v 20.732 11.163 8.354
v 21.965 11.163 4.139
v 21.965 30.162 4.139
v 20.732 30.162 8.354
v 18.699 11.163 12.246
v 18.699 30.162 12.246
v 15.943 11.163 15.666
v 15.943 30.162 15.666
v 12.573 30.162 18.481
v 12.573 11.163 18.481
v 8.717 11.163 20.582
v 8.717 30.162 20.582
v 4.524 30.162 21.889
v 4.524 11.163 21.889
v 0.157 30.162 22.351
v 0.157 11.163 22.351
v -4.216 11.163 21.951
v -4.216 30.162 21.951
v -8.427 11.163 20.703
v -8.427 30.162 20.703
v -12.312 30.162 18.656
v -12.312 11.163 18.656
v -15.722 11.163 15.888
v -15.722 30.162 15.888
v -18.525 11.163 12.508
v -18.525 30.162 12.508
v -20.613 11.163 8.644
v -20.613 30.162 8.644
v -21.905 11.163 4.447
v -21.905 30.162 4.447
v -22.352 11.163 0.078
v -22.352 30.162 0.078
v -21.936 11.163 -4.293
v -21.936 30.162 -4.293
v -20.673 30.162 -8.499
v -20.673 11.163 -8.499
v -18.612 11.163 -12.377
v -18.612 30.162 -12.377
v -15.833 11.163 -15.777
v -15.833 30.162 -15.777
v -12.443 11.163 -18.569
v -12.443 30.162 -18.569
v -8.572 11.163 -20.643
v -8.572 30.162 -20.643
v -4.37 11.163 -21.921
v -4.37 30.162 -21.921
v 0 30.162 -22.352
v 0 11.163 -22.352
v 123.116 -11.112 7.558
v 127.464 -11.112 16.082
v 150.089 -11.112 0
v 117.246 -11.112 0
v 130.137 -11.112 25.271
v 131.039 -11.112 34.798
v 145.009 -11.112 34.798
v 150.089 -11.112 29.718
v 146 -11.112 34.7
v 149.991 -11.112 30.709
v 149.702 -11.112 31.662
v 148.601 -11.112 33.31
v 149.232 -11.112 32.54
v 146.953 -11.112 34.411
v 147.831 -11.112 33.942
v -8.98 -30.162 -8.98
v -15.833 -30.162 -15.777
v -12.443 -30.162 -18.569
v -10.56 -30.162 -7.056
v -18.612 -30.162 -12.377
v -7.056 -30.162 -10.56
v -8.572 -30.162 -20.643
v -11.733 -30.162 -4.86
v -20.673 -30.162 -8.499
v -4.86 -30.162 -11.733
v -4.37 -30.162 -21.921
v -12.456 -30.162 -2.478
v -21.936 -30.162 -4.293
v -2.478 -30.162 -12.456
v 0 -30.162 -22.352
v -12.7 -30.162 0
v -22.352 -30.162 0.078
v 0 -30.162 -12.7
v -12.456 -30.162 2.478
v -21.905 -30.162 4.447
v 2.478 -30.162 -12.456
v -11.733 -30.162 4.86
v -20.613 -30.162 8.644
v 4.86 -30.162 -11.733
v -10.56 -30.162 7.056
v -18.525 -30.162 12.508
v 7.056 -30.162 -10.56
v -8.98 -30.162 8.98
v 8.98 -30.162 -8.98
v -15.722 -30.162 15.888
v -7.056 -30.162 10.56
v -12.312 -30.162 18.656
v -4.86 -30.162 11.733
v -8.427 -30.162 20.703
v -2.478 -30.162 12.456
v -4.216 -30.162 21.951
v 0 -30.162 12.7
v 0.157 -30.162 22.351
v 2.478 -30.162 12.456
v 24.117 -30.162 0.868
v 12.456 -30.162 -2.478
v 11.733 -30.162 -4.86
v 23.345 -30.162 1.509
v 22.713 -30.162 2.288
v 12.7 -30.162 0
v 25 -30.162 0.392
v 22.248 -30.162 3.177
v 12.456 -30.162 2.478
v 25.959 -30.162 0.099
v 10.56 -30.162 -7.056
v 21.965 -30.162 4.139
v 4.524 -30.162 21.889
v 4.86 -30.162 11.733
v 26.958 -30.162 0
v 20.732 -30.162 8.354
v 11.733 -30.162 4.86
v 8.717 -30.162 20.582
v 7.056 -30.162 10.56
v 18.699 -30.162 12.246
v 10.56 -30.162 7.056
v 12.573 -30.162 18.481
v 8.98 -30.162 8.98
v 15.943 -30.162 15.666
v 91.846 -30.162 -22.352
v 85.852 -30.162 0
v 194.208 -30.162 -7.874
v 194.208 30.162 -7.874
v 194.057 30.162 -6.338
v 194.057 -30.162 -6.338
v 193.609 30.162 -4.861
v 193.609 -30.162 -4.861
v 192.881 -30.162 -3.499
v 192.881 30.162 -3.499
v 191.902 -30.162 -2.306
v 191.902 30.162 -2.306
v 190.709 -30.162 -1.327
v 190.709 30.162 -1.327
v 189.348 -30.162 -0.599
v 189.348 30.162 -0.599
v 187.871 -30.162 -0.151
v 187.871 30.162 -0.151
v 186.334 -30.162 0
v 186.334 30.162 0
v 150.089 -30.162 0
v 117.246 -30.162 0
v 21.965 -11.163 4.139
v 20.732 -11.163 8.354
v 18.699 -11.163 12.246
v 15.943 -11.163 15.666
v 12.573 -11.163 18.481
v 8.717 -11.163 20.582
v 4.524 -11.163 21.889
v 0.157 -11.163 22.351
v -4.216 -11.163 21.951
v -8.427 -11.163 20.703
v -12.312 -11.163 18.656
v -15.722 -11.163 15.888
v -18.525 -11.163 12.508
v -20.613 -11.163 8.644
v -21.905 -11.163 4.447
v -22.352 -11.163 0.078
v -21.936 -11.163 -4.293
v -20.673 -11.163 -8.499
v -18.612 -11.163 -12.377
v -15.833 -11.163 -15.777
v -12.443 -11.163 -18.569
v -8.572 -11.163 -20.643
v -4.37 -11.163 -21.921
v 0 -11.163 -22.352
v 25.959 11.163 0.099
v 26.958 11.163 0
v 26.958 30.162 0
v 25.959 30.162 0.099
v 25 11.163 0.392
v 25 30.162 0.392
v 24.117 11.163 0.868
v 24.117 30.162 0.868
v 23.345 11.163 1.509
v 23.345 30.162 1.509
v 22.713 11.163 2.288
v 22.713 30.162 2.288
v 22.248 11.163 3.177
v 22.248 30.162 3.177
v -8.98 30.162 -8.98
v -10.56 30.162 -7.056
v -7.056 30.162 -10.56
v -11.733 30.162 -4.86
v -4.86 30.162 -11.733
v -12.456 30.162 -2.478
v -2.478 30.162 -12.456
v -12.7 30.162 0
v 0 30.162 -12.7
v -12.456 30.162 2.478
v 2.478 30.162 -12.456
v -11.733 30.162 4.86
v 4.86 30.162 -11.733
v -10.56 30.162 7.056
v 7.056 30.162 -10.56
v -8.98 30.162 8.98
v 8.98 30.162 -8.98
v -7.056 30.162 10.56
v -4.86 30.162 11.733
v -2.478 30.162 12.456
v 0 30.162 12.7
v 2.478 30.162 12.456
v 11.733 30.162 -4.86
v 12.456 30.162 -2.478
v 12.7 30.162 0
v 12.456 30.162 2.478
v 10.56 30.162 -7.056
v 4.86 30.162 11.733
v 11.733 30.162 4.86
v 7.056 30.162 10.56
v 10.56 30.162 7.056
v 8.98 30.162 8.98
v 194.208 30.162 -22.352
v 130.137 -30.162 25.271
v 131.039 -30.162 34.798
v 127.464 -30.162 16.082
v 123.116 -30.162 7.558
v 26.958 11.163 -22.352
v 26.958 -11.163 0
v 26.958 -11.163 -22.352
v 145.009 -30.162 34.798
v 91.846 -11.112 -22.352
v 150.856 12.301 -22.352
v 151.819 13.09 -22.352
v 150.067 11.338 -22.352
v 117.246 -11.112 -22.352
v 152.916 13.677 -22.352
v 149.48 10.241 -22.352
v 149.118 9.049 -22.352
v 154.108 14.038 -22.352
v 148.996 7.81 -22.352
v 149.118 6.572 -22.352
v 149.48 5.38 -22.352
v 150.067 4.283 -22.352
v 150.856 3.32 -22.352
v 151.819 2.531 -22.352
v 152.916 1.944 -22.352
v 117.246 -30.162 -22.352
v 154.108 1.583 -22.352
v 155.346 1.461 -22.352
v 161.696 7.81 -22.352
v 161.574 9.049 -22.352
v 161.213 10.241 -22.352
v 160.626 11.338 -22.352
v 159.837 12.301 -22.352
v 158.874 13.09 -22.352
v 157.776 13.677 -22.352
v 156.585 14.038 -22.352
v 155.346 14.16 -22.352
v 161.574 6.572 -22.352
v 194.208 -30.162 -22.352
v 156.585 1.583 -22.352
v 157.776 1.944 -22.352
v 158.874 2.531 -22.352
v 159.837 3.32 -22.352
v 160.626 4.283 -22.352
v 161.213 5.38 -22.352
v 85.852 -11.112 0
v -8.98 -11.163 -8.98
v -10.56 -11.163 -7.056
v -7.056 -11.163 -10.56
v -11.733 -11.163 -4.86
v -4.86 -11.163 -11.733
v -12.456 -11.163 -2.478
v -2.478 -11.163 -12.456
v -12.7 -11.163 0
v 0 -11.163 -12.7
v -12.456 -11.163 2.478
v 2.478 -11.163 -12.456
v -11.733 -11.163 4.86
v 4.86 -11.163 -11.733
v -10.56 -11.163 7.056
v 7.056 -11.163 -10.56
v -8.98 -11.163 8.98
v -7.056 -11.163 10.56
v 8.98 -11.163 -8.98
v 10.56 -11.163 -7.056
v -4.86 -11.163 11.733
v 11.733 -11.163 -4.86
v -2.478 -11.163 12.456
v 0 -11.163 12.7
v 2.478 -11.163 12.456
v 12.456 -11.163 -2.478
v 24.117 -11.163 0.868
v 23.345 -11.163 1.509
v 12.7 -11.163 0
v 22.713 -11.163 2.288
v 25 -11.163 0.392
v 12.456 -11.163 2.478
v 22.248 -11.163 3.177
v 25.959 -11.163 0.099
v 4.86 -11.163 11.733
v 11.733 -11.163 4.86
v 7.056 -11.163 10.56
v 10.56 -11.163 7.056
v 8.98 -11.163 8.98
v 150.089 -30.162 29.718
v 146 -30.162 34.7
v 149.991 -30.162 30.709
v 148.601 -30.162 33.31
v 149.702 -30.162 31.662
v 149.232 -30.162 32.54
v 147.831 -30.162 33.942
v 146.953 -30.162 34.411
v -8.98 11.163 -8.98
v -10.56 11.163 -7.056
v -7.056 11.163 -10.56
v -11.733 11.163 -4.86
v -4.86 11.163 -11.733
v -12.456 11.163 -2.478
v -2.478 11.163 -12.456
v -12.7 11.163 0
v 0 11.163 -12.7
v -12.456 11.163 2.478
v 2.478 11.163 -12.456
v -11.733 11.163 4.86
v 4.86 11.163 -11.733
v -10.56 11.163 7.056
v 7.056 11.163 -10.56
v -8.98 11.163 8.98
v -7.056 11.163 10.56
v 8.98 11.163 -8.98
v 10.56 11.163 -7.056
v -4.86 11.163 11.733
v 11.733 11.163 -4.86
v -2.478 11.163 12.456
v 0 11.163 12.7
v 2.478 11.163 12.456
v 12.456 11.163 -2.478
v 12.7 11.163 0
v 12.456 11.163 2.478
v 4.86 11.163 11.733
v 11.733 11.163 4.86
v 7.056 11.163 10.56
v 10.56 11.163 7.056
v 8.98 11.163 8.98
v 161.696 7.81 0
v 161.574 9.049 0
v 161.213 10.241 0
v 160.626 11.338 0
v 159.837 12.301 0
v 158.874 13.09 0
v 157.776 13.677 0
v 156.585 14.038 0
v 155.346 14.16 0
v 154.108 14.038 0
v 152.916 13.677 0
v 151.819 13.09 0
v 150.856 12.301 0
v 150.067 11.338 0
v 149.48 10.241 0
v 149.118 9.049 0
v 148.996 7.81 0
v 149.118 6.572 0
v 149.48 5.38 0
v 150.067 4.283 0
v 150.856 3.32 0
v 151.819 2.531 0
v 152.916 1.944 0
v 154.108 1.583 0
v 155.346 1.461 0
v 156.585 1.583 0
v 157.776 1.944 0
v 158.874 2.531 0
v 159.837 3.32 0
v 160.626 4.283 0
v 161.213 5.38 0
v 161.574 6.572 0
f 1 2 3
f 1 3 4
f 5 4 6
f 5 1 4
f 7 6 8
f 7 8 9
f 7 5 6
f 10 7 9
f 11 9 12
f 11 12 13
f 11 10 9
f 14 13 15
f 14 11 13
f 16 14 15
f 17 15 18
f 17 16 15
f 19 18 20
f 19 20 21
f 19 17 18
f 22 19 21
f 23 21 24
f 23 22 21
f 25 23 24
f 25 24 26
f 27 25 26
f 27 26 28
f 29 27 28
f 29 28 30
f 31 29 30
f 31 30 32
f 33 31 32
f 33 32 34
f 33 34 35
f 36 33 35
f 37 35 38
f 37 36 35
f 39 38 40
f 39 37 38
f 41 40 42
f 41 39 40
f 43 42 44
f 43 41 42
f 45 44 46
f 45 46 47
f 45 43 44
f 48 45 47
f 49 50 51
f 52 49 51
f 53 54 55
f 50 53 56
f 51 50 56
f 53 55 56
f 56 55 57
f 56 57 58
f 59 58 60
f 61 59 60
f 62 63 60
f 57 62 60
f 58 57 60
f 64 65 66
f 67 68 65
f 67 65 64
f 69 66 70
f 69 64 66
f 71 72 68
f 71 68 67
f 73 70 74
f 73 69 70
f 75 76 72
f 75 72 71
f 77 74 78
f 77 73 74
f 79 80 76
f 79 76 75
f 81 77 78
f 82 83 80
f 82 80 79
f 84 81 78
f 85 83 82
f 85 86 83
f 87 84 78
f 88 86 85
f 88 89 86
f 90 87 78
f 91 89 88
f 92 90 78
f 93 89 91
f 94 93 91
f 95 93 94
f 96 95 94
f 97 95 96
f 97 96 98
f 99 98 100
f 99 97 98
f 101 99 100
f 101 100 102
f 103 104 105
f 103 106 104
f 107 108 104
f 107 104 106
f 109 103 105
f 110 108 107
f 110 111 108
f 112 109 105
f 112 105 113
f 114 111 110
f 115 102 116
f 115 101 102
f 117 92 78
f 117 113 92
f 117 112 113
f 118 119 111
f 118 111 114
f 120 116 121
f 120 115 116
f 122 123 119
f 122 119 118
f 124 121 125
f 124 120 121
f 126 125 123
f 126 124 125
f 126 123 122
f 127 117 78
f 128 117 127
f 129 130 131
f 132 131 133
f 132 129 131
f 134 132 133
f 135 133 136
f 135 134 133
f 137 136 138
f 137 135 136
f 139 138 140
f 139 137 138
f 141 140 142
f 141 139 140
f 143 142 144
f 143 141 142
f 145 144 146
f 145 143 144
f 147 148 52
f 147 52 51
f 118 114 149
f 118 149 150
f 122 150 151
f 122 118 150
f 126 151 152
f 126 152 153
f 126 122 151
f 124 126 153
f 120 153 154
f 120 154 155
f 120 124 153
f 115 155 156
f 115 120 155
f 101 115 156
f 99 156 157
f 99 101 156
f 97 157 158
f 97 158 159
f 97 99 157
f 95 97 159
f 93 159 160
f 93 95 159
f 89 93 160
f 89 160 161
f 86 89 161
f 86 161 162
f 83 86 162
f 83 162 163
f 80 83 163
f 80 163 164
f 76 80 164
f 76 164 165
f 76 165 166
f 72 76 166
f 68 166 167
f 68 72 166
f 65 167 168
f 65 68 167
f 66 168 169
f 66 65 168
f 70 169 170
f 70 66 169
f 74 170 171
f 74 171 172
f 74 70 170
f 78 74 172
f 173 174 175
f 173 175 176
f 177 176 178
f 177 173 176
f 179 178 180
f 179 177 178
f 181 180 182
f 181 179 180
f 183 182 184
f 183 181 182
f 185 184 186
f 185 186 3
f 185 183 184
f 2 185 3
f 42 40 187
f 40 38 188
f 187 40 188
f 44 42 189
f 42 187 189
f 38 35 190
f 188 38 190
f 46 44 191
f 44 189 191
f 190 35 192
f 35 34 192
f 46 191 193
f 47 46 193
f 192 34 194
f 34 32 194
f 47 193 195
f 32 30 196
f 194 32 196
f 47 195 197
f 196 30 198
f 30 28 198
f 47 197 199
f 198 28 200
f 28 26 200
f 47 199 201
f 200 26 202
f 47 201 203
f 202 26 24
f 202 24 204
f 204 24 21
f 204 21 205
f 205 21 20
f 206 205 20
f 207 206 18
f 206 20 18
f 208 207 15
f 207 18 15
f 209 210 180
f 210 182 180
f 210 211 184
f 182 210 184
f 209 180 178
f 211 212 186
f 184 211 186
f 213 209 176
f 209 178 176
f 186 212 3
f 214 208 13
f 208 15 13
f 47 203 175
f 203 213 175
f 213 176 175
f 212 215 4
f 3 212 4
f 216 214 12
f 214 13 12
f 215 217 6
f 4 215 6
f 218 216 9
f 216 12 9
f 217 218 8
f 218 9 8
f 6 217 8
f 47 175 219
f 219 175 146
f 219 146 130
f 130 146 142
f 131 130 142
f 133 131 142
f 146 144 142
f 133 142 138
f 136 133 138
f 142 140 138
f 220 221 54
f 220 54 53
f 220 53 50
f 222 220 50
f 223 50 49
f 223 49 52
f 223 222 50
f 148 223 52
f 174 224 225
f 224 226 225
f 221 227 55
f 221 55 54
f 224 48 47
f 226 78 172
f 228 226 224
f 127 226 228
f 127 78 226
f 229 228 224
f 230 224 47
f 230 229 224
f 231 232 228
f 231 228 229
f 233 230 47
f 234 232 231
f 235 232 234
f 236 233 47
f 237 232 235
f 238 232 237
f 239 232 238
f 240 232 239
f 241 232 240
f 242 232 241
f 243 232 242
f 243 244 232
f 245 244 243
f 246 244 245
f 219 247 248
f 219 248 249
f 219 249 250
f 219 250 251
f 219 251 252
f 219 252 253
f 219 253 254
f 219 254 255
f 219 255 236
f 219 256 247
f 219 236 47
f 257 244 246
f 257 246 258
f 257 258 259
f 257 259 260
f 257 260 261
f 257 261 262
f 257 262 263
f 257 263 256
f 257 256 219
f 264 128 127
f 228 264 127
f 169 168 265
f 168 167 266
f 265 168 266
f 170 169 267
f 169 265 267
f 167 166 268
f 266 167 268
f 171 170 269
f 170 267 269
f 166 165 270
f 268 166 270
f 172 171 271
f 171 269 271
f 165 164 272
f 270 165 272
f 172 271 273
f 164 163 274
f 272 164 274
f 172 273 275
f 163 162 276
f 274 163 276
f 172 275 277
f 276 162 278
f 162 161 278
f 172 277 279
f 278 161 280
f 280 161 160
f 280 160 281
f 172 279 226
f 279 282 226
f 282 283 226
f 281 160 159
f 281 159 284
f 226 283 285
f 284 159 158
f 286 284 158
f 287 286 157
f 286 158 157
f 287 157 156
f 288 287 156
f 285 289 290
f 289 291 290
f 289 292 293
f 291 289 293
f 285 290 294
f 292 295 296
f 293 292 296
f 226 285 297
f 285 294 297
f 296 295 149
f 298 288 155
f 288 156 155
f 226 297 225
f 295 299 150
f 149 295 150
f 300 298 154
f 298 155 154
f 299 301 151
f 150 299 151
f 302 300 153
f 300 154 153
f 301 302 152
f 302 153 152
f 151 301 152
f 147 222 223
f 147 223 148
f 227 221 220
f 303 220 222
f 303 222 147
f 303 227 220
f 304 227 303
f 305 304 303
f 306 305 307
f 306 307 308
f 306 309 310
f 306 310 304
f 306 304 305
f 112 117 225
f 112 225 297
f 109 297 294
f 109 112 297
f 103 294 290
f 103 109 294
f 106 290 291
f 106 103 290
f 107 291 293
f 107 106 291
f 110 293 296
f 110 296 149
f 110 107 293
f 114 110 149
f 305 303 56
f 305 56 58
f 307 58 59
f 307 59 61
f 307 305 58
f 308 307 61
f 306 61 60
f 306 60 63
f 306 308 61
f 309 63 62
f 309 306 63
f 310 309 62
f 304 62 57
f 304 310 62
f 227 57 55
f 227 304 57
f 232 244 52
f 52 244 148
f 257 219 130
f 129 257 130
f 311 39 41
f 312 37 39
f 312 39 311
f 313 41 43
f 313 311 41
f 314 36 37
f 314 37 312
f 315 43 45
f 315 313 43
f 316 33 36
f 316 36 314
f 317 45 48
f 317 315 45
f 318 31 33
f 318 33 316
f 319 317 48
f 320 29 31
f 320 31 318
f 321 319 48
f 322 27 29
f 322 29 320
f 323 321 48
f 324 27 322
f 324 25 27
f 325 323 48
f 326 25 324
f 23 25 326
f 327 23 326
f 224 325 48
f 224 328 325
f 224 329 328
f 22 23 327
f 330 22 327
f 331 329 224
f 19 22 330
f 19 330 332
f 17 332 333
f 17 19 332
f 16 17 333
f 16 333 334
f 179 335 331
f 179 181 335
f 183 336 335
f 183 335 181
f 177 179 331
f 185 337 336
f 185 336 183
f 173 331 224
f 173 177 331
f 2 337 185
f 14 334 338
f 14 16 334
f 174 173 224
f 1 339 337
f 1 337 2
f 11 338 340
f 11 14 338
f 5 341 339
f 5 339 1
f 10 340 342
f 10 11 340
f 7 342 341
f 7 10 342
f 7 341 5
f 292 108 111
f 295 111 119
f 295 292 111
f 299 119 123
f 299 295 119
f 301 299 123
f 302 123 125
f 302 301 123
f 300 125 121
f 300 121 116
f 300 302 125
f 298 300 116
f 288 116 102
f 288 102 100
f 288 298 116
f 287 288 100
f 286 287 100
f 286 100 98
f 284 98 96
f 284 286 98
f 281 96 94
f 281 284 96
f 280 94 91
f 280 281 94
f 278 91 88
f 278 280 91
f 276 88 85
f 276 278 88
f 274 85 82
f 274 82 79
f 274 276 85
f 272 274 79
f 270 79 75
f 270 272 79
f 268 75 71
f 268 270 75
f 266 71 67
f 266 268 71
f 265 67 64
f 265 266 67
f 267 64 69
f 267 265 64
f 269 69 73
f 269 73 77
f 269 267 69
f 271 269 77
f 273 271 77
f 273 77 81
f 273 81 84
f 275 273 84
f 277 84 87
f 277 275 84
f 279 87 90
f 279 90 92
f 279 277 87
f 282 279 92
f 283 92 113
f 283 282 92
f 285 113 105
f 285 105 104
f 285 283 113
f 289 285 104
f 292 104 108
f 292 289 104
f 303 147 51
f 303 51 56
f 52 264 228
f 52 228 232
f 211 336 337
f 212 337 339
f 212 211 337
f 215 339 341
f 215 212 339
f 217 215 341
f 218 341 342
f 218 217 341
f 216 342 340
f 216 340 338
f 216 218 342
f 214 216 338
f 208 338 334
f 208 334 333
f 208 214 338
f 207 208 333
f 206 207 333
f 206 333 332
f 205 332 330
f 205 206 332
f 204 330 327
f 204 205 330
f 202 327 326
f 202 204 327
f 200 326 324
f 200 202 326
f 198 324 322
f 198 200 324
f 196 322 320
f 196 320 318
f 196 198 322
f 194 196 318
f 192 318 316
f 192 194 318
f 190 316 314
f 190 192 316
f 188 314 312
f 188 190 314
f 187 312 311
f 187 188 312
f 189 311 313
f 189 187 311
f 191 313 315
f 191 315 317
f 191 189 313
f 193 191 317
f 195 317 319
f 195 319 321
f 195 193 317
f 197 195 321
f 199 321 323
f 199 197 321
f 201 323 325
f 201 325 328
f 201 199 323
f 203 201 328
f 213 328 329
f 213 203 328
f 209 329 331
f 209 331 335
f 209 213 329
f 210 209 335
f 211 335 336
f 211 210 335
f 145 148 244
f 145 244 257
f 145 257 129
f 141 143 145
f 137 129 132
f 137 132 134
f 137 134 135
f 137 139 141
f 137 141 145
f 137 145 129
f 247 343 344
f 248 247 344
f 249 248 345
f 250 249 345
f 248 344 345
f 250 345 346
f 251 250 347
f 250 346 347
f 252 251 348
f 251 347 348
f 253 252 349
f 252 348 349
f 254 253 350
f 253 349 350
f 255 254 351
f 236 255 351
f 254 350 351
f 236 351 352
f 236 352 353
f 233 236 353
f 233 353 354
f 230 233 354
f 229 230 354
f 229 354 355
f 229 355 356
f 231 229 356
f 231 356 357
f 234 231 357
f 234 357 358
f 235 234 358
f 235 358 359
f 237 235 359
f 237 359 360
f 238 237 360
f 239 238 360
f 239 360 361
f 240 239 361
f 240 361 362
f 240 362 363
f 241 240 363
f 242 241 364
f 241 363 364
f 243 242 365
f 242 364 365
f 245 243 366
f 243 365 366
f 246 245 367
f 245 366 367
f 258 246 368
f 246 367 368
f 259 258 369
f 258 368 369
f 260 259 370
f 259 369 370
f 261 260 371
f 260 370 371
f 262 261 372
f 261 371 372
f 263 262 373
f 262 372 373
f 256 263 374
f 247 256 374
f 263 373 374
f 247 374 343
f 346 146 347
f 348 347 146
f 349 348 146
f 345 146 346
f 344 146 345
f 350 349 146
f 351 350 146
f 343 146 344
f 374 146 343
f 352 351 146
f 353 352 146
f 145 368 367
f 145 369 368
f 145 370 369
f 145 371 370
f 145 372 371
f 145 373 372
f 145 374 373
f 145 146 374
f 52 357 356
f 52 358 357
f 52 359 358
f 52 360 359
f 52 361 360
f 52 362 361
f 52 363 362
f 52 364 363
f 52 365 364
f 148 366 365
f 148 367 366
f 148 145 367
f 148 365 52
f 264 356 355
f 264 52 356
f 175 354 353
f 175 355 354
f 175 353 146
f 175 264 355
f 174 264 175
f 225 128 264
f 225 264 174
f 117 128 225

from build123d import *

# Parameters (mm, degrees)
F0_R     = 12.7
F1_DEPTH = 30.1625
F2_R     = 12.7
F3_DEPTH = 11.1633
F5_DEPTH = 19.05
F7_DEPTH = 19.05
F8_R     = 6.35
F9_DEPTH = 22.353


with BuildPart() as f1:
    # F0 (on Front) → F1 (new body, symmetric)
    with BuildSketch(Plane.XZ):
        with BuildLine():
            ThreePointArc((26.957526296, 0), (23.7150398244, 1.1694141767), (21.9653917967, 4.1392592593))
            ThreePointArc((21.9653917967, 4.1392592593), (-17.2065776226, 14.266940475), (0, -22.352))
            Line((0, -22.352), (26.957526296, -22.352))
            Line((26.957526296, -22.352), (26.957526296, 0))
        make_face()
        Circle(F0_R, mode=Mode.SUBTRACT)
        with BuildLine():
            Line((186.3344, 0), (26.957526296, 0))
            Line((26.957526296, 0), (26.957526296, -22.352))
            Line((26.957526296, -22.352), (194.2084, -22.352))
            Line((194.2084, -22.352), (194.2084, -7.874))
            ThreePointArc((194.2084, -7.874), (191.9021587951, -2.3062412049), (186.3344, 0))
        make_face()
    extrude(amount=F1_DEPTH, both=True)

    # F2 (on Front) → F3 (cut, symmetric)
    with BuildSketch(Plane.XZ):
        with BuildLine():
            ThreePointArc((26.957526296, 0), (23.7150398244, 1.1694141767), (21.9653917967, 4.1392592593))
            ThreePointArc((21.9653917967, 4.1392592593), (-17.2065776226, 14.266940475), (0, -22.352))
            Line((0, -22.352), (26.957526296, -22.352))
            Line((26.957526296, -22.352), (26.957526296, 0))
        make_face()
        Circle(F2_R, mode=Mode.SUBTRACT)
    extrude(amount=F3_DEPTH, both=True, mode=Mode.SUBTRACT)

    # F4 (on face) → F5 (cut)
    with BuildSketch(Plane.XZ.offset(30.1625)):
        Polygon((117.2464, 0), (85.852, 0), (91.8464, -22.352), (117.2464, -22.352), align=None)
    extrude(amount=-F5_DEPTH, mode=Mode.SUBTRACT)

    # F8 (on face) → F9 (cut, through all)
    with BuildSketch(Plane.XY):
        with Locations((155.3464, 7.8105)):
            Circle(F8_R)
    extrude(amount=-F9_DEPTH, mode=Mode.SUBTRACT)


with BuildPart() as f7:
    # F6 (on face) → F7 (new body)
    with BuildSketch(Plane.XZ.offset(30.1625)):
        with BuildLine():
            Line((117.2464, 0), (150.0886, 0))
            Line((150.0886, 0), (150.0886, 29.718))
            ThreePointArc((150.0886, 29.718), (148.6007024484, 33.3101024484), (145.0086, 34.798))
            Line((145.0086, 34.798), (131.0386, 34.798))
            ThreePointArc((131.0385999467, 34.798), (127.464415333, 16.0823576399), (117.2464, 0))
        make_face()
    extrude(amount=-F7_DEPTH)


solid = Compound([f1.part, f7.part])
